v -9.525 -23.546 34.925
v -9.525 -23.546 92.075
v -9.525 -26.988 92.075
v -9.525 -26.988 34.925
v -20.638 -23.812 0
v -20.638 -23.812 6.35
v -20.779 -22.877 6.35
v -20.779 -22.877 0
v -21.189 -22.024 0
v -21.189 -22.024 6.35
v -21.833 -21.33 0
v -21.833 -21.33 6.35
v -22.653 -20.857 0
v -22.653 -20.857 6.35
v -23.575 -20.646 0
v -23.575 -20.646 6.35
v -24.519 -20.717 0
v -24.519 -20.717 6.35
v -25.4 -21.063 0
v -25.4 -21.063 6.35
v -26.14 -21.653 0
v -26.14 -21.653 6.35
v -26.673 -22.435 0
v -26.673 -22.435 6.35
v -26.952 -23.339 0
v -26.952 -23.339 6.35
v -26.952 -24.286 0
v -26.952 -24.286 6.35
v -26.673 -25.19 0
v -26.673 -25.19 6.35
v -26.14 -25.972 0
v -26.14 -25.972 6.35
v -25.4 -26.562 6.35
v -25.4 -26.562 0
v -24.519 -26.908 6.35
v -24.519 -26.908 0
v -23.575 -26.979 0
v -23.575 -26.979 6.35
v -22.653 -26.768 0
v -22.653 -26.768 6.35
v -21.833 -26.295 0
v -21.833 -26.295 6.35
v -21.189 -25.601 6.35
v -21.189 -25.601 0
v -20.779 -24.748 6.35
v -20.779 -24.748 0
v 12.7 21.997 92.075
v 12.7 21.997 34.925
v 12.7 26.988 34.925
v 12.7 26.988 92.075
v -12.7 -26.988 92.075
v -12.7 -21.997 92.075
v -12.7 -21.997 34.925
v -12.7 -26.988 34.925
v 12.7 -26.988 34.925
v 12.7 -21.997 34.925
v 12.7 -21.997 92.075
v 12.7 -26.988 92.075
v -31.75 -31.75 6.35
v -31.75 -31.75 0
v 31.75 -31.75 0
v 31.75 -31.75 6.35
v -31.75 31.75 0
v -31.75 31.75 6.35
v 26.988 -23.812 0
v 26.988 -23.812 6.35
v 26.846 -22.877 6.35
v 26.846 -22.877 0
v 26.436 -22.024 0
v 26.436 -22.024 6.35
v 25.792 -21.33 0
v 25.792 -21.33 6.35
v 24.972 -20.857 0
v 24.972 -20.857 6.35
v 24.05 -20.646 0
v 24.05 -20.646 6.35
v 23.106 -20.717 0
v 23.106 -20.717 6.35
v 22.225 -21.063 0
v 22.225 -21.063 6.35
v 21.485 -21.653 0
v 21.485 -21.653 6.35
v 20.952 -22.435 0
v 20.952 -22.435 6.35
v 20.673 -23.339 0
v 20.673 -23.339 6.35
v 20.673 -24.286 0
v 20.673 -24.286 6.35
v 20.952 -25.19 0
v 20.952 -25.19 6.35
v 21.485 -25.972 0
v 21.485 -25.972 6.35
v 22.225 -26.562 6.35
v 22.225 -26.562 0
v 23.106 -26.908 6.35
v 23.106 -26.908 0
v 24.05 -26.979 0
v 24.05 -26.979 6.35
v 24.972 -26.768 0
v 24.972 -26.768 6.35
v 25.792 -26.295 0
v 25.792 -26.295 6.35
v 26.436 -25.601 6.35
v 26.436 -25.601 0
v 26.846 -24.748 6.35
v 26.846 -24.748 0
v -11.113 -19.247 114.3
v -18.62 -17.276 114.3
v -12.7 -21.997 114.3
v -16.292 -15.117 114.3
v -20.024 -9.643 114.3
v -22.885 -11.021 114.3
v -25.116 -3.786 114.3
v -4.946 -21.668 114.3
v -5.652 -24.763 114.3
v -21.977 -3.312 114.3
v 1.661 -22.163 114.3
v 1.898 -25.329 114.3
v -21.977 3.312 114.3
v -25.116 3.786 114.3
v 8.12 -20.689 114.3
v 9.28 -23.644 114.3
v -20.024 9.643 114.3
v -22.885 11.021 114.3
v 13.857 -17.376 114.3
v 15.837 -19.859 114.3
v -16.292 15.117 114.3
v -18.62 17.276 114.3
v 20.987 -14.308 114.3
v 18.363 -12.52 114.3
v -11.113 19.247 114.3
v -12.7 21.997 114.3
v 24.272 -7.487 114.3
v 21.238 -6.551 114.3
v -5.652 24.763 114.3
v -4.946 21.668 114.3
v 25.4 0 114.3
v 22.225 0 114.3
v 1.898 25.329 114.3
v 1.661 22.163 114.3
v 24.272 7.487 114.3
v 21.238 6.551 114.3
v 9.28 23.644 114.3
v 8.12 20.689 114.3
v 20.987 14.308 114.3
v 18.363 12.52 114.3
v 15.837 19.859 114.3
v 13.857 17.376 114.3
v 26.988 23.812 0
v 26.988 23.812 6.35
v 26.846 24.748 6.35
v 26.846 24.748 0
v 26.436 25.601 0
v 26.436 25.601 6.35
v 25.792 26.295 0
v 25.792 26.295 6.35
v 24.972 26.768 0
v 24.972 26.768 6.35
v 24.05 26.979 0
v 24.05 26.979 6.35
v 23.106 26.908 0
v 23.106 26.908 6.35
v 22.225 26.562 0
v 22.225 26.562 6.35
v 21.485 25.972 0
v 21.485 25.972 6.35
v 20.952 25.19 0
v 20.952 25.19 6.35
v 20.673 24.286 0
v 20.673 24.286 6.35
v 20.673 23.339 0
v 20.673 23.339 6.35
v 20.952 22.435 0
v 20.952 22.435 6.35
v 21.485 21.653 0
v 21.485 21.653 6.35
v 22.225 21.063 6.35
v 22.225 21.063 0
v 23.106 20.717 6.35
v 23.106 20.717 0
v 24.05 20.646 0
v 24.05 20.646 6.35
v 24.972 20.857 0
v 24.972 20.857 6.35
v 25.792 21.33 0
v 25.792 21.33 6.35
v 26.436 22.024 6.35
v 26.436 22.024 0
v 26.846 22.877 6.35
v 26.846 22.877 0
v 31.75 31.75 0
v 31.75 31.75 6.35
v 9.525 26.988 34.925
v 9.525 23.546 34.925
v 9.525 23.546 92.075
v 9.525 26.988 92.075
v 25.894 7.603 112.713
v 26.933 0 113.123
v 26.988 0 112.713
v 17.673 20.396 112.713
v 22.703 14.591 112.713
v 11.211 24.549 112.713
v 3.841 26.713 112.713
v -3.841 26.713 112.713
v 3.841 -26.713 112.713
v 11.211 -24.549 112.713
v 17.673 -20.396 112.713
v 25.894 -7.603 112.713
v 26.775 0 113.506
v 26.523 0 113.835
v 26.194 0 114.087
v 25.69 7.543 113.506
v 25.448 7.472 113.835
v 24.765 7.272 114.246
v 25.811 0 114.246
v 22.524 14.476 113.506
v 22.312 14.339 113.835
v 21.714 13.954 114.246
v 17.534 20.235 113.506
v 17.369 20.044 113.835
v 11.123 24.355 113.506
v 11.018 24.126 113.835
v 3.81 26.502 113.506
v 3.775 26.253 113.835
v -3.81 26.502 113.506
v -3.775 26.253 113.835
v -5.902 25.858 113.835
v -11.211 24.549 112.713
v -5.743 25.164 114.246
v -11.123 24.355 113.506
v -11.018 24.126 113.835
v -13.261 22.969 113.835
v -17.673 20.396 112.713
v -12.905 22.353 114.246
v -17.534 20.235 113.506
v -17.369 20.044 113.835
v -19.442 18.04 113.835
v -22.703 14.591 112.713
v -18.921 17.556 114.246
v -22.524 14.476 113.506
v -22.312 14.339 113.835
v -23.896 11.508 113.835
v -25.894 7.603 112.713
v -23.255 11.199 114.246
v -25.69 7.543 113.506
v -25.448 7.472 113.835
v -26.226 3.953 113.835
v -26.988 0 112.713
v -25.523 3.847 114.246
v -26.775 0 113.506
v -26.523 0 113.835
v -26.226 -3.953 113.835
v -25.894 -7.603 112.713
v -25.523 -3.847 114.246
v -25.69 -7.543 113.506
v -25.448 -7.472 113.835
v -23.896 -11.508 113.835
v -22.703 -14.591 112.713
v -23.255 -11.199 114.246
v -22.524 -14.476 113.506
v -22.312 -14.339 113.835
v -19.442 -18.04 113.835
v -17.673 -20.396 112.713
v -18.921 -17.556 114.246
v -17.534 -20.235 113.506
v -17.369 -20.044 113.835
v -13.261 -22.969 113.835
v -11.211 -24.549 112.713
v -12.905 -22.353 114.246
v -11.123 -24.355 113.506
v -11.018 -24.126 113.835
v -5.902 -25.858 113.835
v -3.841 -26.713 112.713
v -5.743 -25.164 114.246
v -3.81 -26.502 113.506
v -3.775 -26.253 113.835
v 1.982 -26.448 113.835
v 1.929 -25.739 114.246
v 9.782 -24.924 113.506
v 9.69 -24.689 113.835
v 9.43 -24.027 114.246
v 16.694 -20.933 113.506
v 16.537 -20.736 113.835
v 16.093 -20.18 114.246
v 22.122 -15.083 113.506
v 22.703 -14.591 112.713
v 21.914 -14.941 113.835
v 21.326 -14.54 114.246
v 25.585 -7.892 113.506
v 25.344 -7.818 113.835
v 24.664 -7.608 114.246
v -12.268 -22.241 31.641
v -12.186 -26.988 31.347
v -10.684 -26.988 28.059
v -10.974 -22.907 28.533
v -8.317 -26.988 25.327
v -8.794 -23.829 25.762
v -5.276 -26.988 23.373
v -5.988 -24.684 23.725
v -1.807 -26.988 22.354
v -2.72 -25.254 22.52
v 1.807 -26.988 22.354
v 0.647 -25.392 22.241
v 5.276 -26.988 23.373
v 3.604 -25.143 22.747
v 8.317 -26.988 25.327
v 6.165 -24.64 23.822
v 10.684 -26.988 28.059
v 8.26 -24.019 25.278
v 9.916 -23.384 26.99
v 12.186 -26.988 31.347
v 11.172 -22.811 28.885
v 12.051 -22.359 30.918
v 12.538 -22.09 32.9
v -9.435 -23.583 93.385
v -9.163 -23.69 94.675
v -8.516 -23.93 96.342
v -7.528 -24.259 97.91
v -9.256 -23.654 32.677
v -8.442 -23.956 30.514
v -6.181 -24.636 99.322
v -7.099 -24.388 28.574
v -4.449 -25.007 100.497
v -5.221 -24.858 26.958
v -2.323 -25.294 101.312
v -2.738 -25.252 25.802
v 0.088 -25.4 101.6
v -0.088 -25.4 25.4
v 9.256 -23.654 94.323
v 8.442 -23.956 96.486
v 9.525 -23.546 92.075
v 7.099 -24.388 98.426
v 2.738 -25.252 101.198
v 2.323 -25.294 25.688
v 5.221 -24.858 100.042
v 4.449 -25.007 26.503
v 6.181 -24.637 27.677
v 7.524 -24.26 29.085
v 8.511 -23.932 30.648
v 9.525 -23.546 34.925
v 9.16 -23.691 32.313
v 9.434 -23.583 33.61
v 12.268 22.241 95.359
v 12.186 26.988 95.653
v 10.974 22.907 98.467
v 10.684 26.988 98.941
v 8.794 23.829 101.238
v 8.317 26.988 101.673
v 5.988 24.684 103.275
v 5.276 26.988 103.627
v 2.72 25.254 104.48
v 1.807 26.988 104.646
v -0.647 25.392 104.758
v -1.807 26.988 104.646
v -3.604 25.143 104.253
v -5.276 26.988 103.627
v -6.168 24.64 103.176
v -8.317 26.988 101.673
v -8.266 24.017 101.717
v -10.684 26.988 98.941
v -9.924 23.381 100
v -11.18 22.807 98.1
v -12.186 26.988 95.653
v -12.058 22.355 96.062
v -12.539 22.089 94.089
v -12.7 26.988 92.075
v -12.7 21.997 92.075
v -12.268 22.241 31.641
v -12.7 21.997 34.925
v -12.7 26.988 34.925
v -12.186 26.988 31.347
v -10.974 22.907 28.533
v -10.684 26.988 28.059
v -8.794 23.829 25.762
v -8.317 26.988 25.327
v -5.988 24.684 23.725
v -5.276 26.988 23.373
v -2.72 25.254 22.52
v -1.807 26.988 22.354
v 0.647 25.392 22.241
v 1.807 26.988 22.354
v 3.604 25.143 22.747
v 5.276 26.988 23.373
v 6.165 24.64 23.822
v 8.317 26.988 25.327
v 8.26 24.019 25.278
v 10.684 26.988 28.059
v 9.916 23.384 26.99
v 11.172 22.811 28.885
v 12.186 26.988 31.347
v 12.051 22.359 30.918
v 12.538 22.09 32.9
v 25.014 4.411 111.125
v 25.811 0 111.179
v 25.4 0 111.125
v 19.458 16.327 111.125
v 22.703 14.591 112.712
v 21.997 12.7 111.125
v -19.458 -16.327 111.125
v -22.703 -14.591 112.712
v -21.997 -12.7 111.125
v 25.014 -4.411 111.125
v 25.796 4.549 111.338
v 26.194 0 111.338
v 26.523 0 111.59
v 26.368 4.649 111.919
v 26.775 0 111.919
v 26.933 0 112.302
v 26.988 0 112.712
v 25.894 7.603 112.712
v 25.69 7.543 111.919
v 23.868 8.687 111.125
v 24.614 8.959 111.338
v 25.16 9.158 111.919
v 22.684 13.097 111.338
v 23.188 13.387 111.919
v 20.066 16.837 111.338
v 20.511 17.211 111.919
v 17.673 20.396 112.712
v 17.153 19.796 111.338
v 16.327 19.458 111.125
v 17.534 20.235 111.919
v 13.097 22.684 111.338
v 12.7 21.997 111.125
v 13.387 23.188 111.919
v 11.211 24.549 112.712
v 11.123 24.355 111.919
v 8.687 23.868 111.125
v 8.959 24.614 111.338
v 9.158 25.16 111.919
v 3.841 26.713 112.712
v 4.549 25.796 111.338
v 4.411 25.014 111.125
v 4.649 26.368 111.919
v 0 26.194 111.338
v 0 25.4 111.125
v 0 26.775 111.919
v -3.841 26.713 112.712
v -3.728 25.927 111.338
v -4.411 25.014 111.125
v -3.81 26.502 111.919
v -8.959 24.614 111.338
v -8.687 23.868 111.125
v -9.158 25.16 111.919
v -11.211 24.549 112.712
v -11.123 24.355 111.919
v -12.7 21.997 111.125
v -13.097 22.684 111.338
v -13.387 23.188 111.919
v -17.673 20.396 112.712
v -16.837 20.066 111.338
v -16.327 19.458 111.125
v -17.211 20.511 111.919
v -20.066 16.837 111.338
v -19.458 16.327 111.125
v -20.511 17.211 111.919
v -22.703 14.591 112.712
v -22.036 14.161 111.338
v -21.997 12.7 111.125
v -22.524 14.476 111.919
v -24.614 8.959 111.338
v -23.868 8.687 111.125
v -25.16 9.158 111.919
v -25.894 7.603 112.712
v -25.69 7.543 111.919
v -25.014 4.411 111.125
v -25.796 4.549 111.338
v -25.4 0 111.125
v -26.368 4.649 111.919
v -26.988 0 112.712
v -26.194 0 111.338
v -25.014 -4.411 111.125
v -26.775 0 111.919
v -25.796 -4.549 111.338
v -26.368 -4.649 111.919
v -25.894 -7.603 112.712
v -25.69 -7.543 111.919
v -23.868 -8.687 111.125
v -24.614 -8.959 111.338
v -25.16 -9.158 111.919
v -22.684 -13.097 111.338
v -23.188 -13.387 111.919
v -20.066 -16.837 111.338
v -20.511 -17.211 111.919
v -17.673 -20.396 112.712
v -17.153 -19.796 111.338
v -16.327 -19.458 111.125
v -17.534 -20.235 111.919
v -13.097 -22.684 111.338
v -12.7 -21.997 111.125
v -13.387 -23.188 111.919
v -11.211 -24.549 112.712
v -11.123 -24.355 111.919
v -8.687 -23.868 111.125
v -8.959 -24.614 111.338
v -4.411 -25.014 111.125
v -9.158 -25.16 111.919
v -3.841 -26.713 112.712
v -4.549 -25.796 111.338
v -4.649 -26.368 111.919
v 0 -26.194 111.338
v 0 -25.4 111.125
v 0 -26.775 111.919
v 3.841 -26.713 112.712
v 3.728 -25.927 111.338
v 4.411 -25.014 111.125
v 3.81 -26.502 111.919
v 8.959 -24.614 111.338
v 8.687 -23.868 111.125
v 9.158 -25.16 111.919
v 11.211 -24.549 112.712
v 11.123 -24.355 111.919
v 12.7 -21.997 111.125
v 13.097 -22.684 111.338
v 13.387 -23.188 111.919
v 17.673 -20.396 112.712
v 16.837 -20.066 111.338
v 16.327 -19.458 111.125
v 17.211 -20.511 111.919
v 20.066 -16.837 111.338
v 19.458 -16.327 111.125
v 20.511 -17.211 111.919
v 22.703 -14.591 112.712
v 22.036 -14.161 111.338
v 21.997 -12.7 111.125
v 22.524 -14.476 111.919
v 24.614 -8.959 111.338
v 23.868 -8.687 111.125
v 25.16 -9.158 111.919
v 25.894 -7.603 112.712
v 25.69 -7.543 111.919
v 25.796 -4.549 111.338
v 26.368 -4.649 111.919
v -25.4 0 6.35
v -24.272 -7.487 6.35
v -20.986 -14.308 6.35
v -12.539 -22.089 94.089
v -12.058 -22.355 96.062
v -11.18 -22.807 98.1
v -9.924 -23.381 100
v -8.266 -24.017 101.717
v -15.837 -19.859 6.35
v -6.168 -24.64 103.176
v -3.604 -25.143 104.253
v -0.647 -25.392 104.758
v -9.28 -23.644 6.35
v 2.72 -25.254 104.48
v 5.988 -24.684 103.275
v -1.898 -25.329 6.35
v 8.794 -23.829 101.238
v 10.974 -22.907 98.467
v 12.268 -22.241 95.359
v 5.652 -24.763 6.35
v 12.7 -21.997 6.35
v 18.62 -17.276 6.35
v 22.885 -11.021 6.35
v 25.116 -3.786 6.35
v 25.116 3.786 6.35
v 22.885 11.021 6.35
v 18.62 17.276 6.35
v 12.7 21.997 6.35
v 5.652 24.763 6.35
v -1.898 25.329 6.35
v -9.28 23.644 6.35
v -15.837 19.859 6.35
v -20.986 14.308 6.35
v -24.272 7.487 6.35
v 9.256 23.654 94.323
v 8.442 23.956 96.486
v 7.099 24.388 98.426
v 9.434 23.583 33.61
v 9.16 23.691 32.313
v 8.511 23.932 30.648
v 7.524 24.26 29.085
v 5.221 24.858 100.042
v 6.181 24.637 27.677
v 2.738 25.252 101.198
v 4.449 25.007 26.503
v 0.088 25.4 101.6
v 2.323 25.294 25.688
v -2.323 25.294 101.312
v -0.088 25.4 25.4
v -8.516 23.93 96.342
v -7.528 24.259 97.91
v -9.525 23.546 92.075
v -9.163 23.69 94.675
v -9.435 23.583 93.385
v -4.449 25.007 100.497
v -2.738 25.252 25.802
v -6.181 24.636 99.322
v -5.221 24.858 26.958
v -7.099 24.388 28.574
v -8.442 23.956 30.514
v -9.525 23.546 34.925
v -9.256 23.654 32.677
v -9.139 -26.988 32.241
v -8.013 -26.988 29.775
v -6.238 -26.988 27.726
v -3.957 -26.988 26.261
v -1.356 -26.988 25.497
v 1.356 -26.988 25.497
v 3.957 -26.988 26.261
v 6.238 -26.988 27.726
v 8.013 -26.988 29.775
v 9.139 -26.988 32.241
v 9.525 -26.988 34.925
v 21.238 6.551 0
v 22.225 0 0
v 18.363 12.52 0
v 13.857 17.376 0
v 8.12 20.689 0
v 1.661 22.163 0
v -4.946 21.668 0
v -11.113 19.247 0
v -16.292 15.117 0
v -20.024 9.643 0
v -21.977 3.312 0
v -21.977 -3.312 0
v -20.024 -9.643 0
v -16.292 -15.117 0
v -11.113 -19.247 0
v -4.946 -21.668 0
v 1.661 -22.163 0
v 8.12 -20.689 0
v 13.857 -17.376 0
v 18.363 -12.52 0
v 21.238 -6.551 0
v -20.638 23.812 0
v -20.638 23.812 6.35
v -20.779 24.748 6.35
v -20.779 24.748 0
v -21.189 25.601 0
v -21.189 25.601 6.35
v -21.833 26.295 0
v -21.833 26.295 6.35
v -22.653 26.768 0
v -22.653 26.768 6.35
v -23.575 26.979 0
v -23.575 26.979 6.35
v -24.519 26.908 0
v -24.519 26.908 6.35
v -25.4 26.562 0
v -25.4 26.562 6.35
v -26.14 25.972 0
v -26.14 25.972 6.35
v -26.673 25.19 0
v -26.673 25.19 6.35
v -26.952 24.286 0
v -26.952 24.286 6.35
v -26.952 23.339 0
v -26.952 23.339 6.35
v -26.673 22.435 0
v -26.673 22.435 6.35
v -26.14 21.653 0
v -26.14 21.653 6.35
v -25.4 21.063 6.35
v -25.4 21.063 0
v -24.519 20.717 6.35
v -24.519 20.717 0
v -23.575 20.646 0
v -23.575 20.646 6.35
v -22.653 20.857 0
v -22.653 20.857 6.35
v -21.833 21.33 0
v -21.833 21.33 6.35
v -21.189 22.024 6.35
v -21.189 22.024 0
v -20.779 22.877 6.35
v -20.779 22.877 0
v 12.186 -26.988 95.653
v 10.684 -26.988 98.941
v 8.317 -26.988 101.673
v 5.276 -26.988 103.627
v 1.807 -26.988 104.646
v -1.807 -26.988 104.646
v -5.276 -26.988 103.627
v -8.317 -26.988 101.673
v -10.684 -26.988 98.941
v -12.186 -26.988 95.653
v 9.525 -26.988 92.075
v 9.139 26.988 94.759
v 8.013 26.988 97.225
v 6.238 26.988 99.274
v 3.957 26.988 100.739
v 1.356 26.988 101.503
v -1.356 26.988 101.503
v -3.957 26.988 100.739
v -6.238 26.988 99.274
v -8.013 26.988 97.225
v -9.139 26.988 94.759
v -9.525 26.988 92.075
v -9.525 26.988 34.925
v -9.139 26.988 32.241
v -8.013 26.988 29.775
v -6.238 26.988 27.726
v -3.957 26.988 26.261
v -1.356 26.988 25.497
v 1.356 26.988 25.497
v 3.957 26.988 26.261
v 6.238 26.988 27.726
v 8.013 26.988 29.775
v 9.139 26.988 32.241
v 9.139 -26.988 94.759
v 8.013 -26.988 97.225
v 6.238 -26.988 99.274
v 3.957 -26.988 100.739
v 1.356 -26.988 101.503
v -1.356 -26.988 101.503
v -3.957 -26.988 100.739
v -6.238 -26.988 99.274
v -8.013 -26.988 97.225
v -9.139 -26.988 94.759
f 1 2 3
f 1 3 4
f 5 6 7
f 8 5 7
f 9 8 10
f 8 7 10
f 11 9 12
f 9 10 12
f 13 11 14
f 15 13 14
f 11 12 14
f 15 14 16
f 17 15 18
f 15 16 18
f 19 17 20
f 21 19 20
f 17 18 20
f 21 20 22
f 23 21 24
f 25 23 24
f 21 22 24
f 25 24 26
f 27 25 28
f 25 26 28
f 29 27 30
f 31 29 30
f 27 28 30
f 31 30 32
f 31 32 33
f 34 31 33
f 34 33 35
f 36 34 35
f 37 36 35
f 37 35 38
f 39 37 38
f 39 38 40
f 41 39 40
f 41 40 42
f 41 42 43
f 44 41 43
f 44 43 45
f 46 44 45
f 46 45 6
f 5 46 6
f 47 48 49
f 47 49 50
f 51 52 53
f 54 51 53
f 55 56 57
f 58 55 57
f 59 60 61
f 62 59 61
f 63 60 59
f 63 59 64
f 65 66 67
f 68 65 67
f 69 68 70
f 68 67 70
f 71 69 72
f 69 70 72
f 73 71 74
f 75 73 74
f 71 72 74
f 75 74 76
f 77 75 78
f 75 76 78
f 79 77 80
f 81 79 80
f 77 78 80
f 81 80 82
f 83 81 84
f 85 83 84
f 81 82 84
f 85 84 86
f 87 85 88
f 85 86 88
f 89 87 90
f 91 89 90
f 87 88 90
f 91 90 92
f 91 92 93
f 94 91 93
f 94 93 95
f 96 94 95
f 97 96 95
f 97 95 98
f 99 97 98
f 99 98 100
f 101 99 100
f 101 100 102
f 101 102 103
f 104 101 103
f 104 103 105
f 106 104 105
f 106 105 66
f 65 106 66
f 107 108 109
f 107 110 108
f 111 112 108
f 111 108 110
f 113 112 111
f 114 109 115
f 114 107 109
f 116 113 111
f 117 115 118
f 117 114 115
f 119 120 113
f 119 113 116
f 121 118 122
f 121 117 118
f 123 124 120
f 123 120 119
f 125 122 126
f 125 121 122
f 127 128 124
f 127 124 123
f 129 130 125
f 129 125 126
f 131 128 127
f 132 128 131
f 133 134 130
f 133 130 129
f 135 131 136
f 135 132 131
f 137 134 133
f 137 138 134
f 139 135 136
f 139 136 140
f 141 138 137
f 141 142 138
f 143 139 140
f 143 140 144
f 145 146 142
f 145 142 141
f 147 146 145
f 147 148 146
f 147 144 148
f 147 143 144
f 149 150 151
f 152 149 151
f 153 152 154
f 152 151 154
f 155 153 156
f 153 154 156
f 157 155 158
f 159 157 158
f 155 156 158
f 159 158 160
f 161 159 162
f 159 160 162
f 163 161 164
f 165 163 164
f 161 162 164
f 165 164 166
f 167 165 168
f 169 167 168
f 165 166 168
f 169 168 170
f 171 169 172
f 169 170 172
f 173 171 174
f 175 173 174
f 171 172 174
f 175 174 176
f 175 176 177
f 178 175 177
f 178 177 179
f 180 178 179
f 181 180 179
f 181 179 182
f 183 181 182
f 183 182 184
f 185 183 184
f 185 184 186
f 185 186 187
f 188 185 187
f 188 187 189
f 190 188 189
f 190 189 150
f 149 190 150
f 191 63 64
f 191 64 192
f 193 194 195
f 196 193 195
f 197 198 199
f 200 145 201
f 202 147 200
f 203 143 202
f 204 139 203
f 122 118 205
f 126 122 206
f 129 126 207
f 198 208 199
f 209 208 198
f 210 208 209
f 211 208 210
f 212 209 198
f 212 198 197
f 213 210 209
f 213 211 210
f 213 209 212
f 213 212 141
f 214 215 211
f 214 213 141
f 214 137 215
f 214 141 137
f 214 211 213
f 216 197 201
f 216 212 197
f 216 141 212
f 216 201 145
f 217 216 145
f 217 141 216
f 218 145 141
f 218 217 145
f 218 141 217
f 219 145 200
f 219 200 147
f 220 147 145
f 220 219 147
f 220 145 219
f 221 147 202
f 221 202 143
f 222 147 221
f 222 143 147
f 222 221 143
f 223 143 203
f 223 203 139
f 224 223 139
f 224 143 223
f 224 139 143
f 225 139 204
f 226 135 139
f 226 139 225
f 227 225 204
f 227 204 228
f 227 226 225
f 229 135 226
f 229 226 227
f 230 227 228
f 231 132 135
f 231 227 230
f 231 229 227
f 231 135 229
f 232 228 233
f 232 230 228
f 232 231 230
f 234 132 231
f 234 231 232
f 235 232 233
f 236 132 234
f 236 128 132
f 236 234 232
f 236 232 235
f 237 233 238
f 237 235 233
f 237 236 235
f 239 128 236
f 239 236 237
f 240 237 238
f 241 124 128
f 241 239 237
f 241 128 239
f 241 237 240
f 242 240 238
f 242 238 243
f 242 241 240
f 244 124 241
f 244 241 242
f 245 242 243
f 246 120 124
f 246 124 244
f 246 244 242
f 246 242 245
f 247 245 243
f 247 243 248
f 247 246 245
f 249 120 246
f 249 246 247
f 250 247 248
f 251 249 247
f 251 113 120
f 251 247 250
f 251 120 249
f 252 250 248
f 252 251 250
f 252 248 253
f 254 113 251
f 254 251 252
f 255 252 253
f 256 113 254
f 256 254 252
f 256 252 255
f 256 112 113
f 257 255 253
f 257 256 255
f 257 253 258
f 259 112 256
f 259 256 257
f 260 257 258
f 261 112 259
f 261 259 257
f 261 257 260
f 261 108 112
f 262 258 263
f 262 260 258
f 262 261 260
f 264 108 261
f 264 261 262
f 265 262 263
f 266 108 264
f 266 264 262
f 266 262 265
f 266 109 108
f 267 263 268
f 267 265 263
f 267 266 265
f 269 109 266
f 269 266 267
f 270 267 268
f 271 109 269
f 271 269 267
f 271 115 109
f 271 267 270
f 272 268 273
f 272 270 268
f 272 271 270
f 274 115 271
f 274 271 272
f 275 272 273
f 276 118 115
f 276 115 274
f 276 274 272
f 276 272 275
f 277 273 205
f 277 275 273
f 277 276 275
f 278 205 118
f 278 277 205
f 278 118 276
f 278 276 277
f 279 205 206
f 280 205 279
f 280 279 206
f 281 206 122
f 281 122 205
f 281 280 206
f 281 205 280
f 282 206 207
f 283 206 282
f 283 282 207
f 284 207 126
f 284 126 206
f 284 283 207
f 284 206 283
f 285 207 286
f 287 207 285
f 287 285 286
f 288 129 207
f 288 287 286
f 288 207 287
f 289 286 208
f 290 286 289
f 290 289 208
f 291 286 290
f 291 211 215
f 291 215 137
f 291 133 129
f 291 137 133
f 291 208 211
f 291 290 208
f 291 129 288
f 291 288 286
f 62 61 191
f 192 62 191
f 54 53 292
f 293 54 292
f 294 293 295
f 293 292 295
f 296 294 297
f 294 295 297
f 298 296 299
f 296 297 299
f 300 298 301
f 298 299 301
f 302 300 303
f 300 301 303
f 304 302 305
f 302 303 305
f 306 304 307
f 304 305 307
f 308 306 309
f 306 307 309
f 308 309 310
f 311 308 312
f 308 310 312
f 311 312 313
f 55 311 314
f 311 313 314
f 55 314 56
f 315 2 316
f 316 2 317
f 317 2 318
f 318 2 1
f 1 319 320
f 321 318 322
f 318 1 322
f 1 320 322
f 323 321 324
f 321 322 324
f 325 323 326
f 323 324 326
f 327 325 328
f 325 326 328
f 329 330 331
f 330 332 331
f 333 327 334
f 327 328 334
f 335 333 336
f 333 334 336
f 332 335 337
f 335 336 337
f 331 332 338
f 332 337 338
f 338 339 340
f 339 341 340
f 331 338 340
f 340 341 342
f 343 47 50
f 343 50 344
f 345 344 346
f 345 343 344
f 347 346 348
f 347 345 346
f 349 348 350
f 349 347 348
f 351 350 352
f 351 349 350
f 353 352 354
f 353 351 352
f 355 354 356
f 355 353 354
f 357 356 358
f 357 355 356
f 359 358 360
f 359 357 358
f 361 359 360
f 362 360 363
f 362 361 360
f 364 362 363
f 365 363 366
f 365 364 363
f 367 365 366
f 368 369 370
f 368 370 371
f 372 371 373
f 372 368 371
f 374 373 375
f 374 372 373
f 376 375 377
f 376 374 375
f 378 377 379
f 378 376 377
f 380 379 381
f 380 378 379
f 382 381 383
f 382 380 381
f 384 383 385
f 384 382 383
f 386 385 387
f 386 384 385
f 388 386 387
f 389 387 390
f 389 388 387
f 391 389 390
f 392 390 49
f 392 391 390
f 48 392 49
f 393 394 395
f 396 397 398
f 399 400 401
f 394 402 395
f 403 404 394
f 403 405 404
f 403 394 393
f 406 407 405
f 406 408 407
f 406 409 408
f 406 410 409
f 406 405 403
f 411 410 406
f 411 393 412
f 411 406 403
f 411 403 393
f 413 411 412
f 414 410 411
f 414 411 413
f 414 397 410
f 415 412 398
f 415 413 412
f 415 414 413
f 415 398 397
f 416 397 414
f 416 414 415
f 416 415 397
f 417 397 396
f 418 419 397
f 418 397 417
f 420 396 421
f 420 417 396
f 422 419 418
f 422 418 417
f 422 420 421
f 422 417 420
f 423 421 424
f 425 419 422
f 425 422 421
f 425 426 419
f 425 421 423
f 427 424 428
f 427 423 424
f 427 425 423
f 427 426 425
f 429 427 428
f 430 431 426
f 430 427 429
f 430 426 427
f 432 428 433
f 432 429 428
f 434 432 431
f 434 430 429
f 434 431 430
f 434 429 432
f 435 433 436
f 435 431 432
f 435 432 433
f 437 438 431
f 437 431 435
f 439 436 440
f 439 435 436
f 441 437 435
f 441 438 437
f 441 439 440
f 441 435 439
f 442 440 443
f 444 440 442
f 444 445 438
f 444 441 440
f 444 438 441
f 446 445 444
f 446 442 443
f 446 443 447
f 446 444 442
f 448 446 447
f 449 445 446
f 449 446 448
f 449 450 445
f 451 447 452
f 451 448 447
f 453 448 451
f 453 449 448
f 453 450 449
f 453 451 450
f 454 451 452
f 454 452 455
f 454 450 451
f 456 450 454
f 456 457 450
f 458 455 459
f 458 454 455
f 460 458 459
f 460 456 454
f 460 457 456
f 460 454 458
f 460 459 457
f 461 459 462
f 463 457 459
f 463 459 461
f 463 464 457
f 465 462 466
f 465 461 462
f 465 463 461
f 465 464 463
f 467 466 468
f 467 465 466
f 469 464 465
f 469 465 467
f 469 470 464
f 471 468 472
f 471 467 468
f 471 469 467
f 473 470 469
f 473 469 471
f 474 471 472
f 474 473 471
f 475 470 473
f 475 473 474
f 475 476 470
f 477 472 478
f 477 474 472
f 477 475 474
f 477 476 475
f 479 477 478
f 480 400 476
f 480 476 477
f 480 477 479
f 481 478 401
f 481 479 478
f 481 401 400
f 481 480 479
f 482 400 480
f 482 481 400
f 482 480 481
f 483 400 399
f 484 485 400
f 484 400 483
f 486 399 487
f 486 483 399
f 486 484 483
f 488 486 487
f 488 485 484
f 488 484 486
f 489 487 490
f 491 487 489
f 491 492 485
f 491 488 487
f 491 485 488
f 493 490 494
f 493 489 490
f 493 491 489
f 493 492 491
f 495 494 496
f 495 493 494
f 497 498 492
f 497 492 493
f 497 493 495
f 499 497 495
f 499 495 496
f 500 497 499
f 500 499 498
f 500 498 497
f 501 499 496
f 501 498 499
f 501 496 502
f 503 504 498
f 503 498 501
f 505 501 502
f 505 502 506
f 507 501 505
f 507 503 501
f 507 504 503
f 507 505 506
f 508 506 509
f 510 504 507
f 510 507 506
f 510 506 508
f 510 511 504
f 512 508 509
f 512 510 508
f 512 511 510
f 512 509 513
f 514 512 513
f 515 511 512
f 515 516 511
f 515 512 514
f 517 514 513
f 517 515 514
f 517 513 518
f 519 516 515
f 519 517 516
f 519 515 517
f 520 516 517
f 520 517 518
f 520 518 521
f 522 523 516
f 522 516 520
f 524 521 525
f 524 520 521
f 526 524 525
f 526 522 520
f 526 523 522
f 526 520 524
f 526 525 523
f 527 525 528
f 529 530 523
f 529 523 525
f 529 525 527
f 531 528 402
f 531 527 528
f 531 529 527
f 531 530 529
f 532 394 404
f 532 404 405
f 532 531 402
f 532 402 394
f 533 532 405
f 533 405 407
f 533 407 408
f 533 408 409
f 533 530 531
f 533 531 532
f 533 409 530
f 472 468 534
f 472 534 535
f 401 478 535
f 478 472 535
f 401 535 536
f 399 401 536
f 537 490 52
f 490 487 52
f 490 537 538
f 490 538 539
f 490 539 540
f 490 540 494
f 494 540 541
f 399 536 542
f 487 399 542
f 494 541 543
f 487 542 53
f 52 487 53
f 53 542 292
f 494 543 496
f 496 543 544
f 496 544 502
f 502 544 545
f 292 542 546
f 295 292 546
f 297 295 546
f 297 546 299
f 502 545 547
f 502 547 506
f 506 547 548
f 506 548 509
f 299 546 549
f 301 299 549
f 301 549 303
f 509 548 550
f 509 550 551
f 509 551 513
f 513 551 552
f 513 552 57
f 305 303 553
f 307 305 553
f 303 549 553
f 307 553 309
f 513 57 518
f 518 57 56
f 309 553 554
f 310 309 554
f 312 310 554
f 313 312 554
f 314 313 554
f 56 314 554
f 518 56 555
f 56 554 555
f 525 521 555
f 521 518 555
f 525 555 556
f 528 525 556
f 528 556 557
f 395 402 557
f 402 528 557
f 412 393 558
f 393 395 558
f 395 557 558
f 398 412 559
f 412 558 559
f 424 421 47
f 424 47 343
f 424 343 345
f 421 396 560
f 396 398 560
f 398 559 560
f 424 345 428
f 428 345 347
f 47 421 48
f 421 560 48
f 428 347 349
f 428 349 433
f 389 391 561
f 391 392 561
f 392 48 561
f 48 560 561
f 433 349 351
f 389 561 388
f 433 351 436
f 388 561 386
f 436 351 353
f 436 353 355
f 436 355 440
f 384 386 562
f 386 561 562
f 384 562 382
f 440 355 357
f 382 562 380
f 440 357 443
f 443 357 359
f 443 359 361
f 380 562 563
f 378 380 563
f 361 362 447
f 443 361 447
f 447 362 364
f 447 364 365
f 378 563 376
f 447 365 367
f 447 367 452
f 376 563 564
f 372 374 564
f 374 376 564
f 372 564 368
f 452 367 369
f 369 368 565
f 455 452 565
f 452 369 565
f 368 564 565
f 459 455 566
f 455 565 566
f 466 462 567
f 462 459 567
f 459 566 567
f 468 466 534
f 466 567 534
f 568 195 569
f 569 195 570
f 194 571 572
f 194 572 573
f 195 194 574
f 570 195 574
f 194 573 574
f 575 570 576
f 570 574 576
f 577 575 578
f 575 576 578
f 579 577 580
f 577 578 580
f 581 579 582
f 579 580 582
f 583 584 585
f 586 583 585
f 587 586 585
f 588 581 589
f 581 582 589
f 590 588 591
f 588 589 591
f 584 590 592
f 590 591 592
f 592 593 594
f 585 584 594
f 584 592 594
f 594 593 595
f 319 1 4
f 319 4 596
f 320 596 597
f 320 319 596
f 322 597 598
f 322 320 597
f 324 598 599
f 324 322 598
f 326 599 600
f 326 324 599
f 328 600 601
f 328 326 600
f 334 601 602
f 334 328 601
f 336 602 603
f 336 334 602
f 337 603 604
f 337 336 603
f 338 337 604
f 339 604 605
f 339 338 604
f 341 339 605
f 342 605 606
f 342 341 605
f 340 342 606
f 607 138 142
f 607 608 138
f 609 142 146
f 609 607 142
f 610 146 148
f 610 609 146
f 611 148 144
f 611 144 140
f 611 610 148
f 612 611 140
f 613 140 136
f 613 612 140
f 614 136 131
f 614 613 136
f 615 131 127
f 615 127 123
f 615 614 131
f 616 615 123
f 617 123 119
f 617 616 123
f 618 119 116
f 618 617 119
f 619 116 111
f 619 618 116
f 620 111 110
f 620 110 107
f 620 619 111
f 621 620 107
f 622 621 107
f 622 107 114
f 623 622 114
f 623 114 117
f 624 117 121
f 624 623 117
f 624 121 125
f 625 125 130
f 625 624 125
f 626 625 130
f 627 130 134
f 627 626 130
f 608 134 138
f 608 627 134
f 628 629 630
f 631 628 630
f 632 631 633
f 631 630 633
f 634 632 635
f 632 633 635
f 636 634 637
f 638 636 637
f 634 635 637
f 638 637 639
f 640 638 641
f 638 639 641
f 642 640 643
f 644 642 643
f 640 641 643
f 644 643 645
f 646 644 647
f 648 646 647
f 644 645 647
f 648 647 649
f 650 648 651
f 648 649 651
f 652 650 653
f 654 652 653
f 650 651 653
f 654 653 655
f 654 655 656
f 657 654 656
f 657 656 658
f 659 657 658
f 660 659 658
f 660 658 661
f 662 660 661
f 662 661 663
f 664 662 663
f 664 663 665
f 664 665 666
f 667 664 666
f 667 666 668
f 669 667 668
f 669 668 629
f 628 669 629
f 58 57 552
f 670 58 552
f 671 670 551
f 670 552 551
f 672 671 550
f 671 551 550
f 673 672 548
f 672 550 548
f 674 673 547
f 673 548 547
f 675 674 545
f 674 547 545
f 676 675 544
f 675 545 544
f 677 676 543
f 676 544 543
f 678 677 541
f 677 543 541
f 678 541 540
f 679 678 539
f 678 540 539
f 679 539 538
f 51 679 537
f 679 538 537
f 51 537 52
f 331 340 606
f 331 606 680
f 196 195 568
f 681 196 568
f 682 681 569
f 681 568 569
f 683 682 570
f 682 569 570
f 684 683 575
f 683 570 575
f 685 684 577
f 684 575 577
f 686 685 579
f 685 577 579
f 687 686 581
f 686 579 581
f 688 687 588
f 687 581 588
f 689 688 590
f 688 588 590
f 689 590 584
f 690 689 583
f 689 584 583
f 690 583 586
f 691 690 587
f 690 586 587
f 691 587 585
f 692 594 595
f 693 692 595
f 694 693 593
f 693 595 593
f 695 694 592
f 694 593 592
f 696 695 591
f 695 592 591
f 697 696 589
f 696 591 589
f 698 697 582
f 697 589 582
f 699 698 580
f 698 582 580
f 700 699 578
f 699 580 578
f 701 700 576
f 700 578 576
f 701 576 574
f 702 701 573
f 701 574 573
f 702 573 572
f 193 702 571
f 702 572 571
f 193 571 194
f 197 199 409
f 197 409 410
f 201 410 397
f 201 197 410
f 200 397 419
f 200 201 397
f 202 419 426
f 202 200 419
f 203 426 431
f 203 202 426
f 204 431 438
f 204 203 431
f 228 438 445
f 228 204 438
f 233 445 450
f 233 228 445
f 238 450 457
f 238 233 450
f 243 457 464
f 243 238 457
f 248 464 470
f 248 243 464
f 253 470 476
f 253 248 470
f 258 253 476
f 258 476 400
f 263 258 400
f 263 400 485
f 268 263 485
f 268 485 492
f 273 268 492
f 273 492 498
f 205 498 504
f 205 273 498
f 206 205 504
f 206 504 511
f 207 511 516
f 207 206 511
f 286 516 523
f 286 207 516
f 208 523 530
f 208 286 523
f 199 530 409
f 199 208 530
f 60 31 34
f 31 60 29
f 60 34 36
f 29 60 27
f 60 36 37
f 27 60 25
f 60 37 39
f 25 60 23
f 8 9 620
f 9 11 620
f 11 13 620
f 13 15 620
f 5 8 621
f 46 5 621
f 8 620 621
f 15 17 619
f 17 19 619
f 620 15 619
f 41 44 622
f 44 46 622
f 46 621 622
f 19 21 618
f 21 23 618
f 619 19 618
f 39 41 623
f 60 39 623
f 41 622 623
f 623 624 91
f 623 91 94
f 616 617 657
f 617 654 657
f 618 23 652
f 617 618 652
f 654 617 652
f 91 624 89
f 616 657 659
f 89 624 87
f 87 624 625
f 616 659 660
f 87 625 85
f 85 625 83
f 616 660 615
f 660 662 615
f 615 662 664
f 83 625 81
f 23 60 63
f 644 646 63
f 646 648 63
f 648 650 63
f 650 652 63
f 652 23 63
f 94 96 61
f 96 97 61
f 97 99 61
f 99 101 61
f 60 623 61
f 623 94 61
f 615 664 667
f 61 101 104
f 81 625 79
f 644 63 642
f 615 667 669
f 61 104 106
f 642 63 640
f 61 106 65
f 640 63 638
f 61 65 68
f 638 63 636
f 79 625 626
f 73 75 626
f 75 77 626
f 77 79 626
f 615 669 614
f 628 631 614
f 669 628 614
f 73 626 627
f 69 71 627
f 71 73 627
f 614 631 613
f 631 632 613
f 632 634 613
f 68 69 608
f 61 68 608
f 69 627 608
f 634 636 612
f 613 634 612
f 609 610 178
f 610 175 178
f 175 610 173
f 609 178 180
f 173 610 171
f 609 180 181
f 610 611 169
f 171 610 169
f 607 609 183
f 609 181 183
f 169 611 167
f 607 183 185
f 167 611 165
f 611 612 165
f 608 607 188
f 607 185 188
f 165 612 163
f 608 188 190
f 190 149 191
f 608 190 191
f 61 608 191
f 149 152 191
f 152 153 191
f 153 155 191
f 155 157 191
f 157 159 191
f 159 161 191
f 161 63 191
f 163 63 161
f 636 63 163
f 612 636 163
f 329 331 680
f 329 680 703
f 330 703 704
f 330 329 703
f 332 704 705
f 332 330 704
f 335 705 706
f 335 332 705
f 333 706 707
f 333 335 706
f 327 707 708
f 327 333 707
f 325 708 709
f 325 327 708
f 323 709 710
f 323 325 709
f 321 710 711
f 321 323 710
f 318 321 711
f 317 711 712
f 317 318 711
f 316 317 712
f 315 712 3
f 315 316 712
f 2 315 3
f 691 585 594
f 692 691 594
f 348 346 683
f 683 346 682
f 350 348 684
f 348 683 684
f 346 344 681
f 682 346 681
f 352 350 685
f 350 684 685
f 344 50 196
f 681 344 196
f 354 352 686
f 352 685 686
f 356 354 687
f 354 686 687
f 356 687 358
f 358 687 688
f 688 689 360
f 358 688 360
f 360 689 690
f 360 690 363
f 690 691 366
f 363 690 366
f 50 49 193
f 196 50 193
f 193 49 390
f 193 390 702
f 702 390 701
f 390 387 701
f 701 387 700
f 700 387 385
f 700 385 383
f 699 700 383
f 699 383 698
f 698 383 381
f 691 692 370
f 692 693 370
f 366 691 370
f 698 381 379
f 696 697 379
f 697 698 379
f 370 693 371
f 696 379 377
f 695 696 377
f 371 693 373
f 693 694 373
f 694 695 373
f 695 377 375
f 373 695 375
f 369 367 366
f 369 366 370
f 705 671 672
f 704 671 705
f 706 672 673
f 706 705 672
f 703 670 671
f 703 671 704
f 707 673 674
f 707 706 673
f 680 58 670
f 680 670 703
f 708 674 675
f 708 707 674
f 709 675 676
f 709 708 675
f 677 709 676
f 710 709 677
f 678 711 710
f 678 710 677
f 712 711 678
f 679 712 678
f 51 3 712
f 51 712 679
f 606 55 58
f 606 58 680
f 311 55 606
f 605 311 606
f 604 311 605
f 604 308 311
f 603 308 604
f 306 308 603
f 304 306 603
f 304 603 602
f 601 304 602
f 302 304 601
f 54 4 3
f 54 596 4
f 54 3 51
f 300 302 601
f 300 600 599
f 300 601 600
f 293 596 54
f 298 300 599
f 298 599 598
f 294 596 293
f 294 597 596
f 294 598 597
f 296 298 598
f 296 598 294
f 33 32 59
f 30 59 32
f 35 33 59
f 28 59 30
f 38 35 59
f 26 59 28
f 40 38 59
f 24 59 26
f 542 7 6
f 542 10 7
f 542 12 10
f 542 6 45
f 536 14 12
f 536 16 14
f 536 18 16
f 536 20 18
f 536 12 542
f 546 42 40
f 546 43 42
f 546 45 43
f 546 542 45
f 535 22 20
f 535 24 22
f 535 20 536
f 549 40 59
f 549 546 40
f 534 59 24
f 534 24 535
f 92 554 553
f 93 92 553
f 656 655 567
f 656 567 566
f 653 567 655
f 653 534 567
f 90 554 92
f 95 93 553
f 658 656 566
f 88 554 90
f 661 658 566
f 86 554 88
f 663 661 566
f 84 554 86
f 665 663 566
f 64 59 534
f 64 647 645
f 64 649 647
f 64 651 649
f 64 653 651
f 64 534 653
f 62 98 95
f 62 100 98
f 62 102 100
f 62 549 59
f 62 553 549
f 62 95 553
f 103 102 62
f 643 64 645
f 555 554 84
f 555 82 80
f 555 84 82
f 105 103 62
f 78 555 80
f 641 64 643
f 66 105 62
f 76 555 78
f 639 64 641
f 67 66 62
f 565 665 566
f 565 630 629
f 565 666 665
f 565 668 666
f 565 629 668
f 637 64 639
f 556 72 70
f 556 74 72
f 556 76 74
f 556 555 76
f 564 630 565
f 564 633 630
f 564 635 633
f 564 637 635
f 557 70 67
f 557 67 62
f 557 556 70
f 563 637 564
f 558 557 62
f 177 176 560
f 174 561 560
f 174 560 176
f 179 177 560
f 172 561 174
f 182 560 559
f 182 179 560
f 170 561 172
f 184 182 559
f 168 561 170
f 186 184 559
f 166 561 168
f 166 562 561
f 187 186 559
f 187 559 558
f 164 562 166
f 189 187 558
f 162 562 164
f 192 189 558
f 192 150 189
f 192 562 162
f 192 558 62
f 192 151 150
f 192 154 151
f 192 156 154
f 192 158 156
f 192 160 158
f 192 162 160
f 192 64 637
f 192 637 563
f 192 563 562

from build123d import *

# Parameters (mm, degrees)
SKETCH2_W                     = 63.5
SKETCH2_H                     = 63.5
SKETCH2_R                     = 22.225
BOSS_EXTRUDE1_DEPTH           = 6.35
SKETCH3_R                     = 25.4
SKETCH3_R_2                   = 22.225
BOSS_EXTRUDE2_DEPTH           = 101.6
SKETCH4_W                     = 63.5
SKETCH4_H                     = 63.5
SKETCH4_R                     = 22.225
BOSS_EXTRUDE3_DEPTH           = 6.35
F_3_0_25_DIAMETER_HOLE1_D     = 6.35
F_3_0_25_DIAMETER_HOLE1_DEPTH = 6.35
SKETCH8_W                     = 63.5
SKETCH8_H                     = 63.5
CUT_EXTRUDE1_DEPTH            = 3.175
BOSS_EXTRUDE4_REACH           = 118.916
SKETCH9_R                     = 25.4
SKETCH9_R_2                   = 22.225
SKETCH10_OUTSIDE_W            = 94.572
SKETCH10_OUTSIDE_H            = 94.572
SKETCH10_OUTSIDE_R            = 26.9875
CUT_EXTRUDE2_DEPTH            = 3.175
FILLET1_R                     = 1.5875
BOSS_EXTRUDE5_DEPTH           = 26.9875
CUT_EXTRUDE3_DEPTH            = 123.80315559
CUT_EXTRUDE3_DEPTH_BACK       = 123.80315559
SKETCH12_R                    = 22.225


with BuildPart() as part:
    # Sketch2 → Boss-Extrude1 (new body)
    with BuildSketch(Plane.XY):
        Rectangle(SKETCH2_W, SKETCH2_H)
        Circle(SKETCH2_R, mode=Mode.SUBTRACT)
    extrude(amount=BOSS_EXTRUDE1_DEPTH)

    # Sketch3 → Boss-Extrude2 (add)
    with BuildSketch(Plane.XY.offset(6.35)):
        with Locations(Location((0, 0, 0), (0, 0, 180))):
            Circle(SKETCH3_R)
        Circle(SKETCH3_R_2, mode=Mode.SUBTRACT)
    extrude(amount=BOSS_EXTRUDE2_DEPTH)

    # Sketch4 → Boss-Extrude3 (add)
    with BuildSketch(Plane.XY.offset(107.95)):
        Rectangle(SKETCH4_W, SKETCH4_H)
        Circle(SKETCH4_R, mode=Mode.SUBTRACT)
    extrude(amount=BOSS_EXTRUDE3_DEPTH)

    # #3 (0.25) Diameter Hole1
    with Locations(Plane(origin=(0, 0, 0), x_dir=(-1, 0, 0), z_dir=(0, 0, -1))):
        with Locations((-23.8125, 23.8125), (-23.8125, -23.8125), (23.8125, -23.8125), (23.8125, 23.8125)):
            Hole(F_3_0_25_DIAMETER_HOLE1_D / 2, depth=F_3_0_25_DIAMETER_HOLE1_DEPTH)

    # Sketch8 → Cut-Extrude1 (cut)
    with BuildSketch(Plane(origin=(0, 0, 107.95), x_dir=(-1, 0, 0), z_dir=(0, 0, -1))):
        Rectangle(SKETCH8_W, SKETCH8_H)
    extrude(amount=-CUT_EXTRUDE1_DEPTH, mode=Mode.SUBTRACT)


with BuildPart() as cut_extrude1_piece_1:
    # of the separate pieces the step leaves, piece 1, a body of its own (cut_extrude1_pieces)
    add(part.part.solids().sort_by_distance((-31.75, -31.75, 0))[0])


with BuildPart() as cut_extrude1_piece_2:
    # of the separate pieces the step leaves, piece 2, a body of its own (cut_extrude1_pieces)
    add(part.part.solids().sort_by_distance((22.225, 0, 111.125))[0])

    # Sketch9 → Boss-Extrude4 (add, up to next)
    with BuildSketch(Plane.XY.offset(107.95), mode=Mode.PRIVATE) as boss_extrude4_sk1:
        with Locations(Location((0, 0, 0), (0, 0, 180))):
            Circle(SKETCH9_R)
        Circle(SKETCH9_R_2, mode=Mode.SUBTRACT)
    boss_extrude4_tool1 = extrude(boss_extrude4_sk1.sketch, amount=BOSS_EXTRUDE4_REACH, mode=Mode.PRIVATE) - cut_extrude1_piece_2.part

    add(cut_extrude1_piece_1.part)  # Boss-Extrude4 merges Cut-Extrude1 piece 1
    add(boss_extrude4_tool1.solids().sort_by_distance((24.68158, 0, 107.95))[0])

    # Sketch10 outside → Cut-Extrude2 (cut)
    with BuildSketch(Plane.XY.offset(114.3)):
        Rectangle(SKETCH10_OUTSIDE_W, SKETCH10_OUTSIDE_H)
        Circle(SKETCH10_OUTSIDE_R, mode=Mode.SUBTRACT)
    extrude(amount=-CUT_EXTRUDE2_DEPTH, mode=Mode.SUBTRACT)

    # Fillet1
    fillet1_edges = [cut_extrude1_piece_2.edges().sort_by_distance(p)[0] for p in [
        (-26.9875, 0, 111.125),
        (-26.9875, 0, 114.3),
    ]]
    fillet(fillet1_edges, radius=FILLET1_R - 0.0001)  # a hair under: the kernel refuses the full size

    # Sketch11 → Boss-Extrude5 (add)
    with BuildSketch(Plane(origin=(0, 0, 0), x_dir=(1, 0, 0), z_dir=(0, 1, 0))):
        with BuildLine():
            Line((-12.7, -92.075), (-12.7, -34.925))
            ThreePointArc((-12.7, -34.925), (0, -22.225), (12.7, -34.925))
            Line((12.7, -34.925), (12.7, -92.075))
            ThreePointArc((12.7, -92.075), (0, -104.775), (-12.7, -92.075))
        make_face()
        with BuildLine():
            Line((-9.525, -92.075), (-9.525, -34.925))
            ThreePointArc((-9.525, -34.925), (0, -25.4), (9.525, -34.925))
            Line((9.525, -34.925), (9.525, -92.075))
            ThreePointArc((9.525, -92.075), (0, -101.6), (-9.525, -92.075))
        make_face(mode=Mode.SUBTRACT)
    boss_extrude5 = extrude(amount=BOSS_EXTRUDE5_DEPTH)

    # Mirror1: Boss-Extrude5 across plane
    add(boss_extrude5.mirror(Plane.ZX))

    # Sketch12 → Cut-Extrude3 (cut, two sides: drawn at the far end of the back side and taken through both)
    with BuildSketch(Plane(origin=(0, 0, 0), x_dir=(-1, 0, 0), z_dir=(0, 0, -1)).offset(-CUT_EXTRUDE3_DEPTH_BACK)):
        with Locations(Location((0, 0, 0), (0, 0, 180))):
            Circle(SKETCH12_R)
    extrude(amount=CUT_EXTRUDE3_DEPTH + CUT_EXTRUDE3_DEPTH_BACK, mode=Mode.SUBTRACT)


solid = cut_extrude1_piece_2.part
